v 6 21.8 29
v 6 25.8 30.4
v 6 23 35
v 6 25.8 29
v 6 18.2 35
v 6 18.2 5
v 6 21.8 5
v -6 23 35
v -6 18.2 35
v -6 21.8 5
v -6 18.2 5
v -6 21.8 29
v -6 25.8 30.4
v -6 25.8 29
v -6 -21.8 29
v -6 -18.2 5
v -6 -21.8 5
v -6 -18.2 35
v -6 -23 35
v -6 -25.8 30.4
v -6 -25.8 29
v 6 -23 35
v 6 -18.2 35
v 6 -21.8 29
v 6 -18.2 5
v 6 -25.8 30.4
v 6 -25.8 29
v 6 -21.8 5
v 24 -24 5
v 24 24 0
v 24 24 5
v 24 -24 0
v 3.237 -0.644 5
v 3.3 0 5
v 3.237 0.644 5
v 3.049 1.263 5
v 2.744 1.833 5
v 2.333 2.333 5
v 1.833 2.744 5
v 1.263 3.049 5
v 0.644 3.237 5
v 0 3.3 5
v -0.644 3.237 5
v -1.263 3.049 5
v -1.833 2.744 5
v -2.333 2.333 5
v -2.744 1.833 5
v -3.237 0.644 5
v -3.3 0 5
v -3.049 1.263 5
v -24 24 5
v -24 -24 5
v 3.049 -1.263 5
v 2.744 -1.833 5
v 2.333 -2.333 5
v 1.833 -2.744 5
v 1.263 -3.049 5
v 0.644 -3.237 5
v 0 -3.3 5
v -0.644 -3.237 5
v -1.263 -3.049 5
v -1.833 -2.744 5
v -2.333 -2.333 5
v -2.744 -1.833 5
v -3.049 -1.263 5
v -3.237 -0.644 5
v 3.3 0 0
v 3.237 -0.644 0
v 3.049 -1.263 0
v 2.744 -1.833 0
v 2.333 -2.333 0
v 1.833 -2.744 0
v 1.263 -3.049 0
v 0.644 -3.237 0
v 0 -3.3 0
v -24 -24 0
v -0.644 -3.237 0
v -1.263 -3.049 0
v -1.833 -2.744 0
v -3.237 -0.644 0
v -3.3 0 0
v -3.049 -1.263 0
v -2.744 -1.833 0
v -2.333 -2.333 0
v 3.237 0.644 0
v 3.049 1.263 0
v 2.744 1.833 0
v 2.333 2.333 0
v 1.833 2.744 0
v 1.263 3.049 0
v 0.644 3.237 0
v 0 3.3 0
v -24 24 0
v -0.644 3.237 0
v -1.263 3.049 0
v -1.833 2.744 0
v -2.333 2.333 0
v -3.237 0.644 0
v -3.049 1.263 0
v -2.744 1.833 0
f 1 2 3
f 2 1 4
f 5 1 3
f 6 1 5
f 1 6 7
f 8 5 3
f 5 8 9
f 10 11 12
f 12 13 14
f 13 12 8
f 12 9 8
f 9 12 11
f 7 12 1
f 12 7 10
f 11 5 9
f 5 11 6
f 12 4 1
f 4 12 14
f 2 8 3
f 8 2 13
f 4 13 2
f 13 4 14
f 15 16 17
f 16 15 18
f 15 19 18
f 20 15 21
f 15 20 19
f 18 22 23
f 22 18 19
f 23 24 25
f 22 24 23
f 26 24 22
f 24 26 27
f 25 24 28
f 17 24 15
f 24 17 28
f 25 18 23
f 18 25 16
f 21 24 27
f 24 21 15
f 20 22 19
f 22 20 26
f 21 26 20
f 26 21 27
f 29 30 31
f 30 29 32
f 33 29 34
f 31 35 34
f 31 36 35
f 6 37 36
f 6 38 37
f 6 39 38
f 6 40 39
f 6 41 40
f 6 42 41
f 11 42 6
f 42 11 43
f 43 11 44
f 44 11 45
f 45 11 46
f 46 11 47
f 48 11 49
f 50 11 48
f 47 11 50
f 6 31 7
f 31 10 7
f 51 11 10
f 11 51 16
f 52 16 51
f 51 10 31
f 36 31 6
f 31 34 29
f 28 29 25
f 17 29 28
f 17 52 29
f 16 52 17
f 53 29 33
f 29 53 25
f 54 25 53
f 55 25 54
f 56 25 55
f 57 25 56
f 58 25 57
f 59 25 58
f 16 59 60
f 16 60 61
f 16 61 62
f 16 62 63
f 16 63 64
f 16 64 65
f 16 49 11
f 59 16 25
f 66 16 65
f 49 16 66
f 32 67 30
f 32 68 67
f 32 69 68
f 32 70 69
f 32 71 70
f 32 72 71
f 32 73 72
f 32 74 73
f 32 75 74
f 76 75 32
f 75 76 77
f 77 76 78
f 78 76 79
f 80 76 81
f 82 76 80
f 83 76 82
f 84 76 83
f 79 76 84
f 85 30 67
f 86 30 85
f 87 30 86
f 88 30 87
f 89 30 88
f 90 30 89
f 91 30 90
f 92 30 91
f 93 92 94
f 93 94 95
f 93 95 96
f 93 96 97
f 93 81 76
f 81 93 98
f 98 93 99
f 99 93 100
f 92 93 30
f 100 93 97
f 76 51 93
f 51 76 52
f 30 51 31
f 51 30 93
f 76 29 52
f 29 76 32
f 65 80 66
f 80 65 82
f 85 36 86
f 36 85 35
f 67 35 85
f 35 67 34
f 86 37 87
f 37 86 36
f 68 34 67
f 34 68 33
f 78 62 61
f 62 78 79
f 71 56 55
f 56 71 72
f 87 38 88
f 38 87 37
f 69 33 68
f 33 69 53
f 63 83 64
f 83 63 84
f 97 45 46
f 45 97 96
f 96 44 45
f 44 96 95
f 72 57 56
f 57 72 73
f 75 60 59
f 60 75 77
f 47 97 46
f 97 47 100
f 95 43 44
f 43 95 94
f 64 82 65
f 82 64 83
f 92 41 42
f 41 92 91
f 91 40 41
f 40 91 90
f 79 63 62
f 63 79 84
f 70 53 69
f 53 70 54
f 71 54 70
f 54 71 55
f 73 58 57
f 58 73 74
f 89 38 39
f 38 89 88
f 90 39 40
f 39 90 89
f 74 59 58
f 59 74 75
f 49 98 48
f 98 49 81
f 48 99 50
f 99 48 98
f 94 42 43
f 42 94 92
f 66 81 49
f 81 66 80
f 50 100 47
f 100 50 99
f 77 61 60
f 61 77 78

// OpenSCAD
$fn = 32;

// ----------------------------------------------------------------------
// Snap-fit latch: 2 arms, 30 mm tall, 4.2 mm undercut hooks
// ----------------------------------------------------------------------

// --- parameters (mm) ---
base_d = 48;              // base plate depth
base_h = 5;               // base plate thickness
span = 40;                // distance between opposite arms
arm_t = 3.6;              // arm thickness
arm_d = 12;               // arm width
height = 30;              // free arm length
head_len = 4.2;           // hook reach
head_h = 6;               // hook height
lead = 1.4;               // lead-in ramp thickness
bore_d = 6.6;             // base fixing bore
top_z = 35;               // height of the arm tips above the base

arms = 2;

difference() {
  union() {
    /* base plate, centred on the arm ring */
    translate([-24, -24, 0]) cube([base_d, base_d, base_h]);
    for (a = [0 : 360 / arms : 359]) rotate([0, 0, a]) {
    /* arm, sunk 0.5 mm into the base */
    translate([-arm_d / 2, span / 2 - arm_t / 2, base_h - 0.5]) cube([arm_d, arm_t, height + 0.5]);
    /* hook: a convex hull of a tall inner block and a thin outer lip
       gives a flat undercut below and a lead-in ramp on top */
    hull() {
      translate([-arm_d / 2, span / 2 + arm_t / 2 - 0.6, top_z - head_h]) cube([arm_d, lead + 0.4, head_h]);
      translate([-arm_d / 2, span / 2 + arm_t / 2 - 0.2, top_z - head_h]) cube([arm_d, head_len, lead]);
    }
    }
  }
  translate([0, 0, -2.5]) cylinder(h = base_h + 5, d = bore_d);
}
